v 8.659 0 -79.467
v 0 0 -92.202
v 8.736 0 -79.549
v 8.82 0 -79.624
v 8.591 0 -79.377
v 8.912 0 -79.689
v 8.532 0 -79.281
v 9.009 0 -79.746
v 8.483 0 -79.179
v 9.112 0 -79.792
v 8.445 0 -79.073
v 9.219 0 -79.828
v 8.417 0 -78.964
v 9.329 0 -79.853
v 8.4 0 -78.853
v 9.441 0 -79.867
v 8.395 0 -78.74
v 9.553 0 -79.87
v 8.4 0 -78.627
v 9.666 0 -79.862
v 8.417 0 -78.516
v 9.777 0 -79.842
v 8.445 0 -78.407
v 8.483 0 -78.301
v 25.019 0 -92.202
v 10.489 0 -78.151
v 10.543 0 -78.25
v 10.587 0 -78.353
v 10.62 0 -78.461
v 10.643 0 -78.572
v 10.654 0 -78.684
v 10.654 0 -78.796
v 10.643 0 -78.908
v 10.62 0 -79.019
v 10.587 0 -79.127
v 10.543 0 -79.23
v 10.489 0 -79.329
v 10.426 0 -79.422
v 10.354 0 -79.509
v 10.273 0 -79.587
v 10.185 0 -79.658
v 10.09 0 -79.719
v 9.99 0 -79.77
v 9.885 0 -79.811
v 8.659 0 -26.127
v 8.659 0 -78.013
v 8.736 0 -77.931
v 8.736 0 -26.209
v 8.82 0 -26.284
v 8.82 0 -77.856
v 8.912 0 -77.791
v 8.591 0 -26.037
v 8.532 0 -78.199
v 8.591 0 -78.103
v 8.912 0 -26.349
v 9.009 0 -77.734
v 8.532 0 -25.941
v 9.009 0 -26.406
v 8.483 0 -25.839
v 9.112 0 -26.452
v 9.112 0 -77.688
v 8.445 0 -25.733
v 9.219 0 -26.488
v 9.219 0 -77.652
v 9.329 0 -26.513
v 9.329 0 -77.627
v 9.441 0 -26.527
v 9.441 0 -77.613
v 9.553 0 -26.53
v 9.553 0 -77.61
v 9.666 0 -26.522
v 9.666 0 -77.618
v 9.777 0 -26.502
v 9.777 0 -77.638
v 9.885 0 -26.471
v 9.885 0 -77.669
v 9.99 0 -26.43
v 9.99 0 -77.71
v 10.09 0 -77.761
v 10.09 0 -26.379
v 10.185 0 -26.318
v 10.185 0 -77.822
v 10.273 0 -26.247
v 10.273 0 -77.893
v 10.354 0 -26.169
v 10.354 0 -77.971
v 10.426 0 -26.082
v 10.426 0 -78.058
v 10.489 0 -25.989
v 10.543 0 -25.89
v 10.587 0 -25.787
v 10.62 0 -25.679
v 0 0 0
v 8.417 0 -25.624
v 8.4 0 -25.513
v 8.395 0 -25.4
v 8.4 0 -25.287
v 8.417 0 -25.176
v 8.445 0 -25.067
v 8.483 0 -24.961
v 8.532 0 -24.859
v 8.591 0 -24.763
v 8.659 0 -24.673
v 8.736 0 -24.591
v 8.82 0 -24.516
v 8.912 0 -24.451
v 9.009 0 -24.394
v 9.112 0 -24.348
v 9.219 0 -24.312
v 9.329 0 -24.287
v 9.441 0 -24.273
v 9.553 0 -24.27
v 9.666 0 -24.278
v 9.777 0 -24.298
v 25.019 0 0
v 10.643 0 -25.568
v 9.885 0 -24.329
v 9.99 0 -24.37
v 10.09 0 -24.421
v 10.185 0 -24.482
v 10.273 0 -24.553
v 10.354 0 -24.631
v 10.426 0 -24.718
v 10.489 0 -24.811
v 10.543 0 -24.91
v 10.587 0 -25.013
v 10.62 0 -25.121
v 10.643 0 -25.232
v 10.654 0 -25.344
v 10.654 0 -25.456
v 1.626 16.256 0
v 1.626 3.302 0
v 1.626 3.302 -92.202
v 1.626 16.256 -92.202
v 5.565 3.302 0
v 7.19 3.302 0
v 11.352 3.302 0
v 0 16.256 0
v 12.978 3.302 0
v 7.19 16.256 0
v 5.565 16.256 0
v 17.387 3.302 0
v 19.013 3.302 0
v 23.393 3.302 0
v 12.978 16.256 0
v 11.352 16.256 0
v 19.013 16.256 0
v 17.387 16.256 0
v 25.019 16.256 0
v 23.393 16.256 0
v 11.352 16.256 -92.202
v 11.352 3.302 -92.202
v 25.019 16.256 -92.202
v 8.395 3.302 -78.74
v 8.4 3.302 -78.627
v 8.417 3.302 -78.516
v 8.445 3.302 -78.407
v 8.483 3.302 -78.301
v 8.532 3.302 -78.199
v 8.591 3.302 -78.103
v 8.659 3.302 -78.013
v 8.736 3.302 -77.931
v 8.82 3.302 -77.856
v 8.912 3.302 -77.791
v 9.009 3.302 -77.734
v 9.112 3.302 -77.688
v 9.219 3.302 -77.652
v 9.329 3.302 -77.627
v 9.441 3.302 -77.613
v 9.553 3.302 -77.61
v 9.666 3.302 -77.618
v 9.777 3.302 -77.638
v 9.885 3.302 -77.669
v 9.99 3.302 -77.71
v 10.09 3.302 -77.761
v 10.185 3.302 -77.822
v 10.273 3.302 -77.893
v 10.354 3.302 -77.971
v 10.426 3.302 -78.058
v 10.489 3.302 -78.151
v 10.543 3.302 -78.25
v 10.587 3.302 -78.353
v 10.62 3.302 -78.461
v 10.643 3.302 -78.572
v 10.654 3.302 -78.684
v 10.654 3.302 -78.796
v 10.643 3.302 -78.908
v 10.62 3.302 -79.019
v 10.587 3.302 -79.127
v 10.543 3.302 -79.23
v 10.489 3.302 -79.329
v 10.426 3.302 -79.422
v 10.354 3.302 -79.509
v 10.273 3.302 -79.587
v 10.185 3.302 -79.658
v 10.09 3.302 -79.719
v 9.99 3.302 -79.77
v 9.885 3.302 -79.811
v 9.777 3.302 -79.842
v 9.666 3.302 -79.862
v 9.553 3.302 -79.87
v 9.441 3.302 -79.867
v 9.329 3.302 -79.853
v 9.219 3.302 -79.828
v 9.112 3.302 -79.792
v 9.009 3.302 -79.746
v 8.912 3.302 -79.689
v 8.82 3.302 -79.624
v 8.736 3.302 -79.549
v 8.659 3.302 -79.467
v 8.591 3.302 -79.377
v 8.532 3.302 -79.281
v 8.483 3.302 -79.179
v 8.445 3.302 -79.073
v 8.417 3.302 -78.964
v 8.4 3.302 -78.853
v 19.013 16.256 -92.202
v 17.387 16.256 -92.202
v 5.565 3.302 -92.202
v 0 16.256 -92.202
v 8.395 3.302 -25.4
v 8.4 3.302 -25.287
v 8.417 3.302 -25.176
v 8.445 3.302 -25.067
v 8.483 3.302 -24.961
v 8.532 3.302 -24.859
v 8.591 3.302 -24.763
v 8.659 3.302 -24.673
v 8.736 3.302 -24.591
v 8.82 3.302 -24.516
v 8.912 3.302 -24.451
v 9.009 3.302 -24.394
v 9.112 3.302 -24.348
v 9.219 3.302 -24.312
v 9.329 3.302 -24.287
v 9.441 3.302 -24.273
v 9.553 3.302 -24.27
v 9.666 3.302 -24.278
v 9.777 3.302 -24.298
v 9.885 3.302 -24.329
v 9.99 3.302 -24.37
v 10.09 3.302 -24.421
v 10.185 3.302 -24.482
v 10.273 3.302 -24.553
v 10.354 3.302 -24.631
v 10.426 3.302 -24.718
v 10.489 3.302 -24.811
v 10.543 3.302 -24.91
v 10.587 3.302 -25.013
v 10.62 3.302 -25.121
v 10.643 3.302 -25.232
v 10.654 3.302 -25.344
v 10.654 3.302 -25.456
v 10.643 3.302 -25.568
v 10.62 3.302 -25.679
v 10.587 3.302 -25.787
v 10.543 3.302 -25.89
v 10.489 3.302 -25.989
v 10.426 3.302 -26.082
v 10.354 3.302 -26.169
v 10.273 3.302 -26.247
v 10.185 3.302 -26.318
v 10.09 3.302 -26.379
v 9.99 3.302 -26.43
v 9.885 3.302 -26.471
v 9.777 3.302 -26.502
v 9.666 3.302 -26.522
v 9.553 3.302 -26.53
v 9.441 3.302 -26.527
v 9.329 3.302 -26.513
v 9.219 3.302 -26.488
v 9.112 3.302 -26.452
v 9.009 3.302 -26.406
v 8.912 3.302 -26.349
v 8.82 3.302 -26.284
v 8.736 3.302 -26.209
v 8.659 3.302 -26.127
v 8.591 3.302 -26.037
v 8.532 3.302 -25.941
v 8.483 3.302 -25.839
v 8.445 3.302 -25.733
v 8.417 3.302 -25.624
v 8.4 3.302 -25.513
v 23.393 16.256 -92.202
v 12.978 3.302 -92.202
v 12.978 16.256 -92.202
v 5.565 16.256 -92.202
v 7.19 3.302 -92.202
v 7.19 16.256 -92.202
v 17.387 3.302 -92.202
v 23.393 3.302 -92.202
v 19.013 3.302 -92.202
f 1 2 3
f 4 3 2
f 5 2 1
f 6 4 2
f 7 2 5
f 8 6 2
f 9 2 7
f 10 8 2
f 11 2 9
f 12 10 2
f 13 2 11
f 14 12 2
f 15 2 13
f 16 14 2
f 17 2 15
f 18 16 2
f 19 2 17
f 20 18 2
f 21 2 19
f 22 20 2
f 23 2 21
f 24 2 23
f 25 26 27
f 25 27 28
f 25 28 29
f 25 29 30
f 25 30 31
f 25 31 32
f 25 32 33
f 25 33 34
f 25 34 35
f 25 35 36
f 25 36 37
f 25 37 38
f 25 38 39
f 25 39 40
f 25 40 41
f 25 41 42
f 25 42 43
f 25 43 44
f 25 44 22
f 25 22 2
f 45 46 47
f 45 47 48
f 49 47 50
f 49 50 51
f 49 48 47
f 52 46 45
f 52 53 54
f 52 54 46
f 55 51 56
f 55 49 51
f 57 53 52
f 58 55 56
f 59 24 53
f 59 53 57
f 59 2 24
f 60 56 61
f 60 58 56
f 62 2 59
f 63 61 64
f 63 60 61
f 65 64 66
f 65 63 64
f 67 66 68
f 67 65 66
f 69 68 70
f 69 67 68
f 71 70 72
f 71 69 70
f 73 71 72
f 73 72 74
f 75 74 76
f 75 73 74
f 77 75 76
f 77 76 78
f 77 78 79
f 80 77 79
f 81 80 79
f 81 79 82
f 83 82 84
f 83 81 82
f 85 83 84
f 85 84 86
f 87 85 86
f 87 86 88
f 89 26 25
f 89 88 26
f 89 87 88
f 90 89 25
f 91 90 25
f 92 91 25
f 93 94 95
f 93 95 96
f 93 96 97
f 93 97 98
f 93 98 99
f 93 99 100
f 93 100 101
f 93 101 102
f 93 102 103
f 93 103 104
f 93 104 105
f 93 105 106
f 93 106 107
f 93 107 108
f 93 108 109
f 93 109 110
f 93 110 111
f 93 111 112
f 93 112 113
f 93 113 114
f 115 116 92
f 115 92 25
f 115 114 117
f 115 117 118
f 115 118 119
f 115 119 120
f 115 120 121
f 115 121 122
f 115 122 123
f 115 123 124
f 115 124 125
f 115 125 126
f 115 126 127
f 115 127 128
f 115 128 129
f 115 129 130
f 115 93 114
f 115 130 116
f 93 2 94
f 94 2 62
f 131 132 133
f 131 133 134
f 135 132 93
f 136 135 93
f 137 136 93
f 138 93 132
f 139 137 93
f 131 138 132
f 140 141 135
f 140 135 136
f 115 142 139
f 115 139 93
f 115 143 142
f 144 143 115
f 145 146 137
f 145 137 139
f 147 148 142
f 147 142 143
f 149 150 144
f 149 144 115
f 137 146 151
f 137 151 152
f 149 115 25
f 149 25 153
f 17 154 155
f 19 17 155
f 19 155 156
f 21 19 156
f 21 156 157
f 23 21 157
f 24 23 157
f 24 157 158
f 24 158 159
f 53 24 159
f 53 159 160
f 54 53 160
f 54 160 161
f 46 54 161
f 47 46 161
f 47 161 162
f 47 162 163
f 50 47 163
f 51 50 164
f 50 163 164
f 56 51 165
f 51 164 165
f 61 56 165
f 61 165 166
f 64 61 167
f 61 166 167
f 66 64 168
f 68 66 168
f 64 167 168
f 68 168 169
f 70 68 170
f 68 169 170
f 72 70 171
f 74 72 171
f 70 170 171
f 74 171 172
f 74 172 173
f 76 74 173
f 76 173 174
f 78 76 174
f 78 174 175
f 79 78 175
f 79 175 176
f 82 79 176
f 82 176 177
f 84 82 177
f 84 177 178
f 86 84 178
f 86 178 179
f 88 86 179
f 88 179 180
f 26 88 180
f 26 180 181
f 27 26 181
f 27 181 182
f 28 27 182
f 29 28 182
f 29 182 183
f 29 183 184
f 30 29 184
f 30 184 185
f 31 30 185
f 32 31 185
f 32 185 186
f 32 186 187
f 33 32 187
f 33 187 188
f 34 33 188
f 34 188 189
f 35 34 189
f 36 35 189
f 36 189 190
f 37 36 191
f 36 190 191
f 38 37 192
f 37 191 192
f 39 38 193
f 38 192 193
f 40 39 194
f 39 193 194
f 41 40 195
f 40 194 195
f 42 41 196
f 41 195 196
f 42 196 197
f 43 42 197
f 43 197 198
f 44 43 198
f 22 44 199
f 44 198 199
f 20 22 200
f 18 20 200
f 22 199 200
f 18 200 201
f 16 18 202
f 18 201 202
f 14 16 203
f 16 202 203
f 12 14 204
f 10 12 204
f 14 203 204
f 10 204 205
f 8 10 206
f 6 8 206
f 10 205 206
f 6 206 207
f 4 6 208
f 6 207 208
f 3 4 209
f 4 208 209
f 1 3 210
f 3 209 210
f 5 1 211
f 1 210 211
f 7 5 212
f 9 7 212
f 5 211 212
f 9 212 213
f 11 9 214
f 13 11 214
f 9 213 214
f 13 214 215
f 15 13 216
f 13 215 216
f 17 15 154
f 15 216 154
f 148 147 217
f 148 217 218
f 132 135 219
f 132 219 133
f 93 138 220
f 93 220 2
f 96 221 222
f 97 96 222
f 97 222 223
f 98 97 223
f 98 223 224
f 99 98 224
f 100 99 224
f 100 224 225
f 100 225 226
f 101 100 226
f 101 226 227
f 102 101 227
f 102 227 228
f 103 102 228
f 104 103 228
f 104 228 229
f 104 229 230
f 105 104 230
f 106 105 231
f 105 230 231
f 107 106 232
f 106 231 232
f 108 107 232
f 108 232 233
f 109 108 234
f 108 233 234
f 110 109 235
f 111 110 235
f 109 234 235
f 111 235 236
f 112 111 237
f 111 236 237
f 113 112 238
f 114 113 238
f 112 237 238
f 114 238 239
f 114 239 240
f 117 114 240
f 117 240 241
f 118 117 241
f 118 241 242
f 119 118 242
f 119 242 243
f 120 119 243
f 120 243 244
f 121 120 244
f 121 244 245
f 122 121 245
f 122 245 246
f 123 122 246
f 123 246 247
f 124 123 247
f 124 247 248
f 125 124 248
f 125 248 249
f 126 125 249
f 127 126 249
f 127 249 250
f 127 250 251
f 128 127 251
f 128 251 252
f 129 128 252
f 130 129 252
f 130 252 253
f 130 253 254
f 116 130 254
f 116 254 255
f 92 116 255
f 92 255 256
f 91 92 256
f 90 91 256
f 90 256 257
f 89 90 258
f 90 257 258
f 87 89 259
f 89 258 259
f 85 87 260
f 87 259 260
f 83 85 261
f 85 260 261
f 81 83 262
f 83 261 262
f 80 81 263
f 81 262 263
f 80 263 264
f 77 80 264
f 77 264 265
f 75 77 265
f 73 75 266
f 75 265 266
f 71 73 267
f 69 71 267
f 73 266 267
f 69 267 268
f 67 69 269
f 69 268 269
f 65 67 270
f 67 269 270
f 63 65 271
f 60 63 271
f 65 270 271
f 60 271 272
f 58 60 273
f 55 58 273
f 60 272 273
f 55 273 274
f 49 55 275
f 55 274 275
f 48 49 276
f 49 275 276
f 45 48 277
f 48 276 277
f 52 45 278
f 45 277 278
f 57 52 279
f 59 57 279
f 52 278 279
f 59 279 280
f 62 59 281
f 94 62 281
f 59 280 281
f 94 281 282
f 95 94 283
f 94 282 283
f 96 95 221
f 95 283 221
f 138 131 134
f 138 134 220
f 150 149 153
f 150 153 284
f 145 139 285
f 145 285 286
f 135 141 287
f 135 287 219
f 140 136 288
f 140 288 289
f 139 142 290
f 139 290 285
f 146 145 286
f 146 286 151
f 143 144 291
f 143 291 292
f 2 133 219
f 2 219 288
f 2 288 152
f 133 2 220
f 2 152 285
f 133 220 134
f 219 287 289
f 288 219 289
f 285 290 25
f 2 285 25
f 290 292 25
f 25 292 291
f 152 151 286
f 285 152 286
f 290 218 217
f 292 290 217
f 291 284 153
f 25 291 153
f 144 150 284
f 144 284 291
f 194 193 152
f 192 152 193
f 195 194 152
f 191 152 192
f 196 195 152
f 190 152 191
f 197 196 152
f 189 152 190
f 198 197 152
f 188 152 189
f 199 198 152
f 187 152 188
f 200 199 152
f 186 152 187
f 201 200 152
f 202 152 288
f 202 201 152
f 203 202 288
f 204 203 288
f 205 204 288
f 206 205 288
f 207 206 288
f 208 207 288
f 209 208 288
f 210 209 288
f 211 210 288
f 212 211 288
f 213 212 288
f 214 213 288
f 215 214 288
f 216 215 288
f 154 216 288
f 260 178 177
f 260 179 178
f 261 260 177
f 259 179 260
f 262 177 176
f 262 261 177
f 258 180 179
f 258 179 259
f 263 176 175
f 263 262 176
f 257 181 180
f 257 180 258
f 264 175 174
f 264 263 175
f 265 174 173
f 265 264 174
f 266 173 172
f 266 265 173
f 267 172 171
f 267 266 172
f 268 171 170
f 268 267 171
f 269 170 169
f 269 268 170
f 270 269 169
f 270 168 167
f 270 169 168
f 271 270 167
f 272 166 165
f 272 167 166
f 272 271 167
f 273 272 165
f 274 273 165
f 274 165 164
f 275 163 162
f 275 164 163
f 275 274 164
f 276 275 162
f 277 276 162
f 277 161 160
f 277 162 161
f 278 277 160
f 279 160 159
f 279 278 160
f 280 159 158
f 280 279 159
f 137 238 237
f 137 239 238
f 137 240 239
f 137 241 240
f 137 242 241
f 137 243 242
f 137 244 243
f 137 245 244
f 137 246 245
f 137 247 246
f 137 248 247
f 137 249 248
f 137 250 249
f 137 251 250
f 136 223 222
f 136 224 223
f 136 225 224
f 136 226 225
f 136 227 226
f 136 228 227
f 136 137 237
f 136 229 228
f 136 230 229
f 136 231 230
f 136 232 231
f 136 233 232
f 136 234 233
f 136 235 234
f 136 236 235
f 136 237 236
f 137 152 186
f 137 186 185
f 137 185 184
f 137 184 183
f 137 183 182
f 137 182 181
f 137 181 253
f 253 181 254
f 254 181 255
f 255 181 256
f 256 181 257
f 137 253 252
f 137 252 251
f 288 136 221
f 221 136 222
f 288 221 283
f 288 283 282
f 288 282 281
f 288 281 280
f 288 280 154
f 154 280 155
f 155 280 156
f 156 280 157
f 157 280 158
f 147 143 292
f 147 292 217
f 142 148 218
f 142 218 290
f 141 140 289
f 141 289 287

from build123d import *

# Parameters (mm, degrees)
EXTRUDE1_DEPTH            = 92.202
F_4_40_TAPPED_HOLE1_D     = 2.2606
F_4_40_TAPPED_HOLE1_DEPTH = 7.5946
F_4_40_TAPPED_HOLE1_TIP   = 0.679152758


with BuildPart() as part:
    # Sketch1 → Extrude1 (new body)
    with BuildSketch(Plane.XY):
        Polygon((0, 0), (25.019, 0), (25.019, 16.256), (23.3934, 16.256), (23.3934, 3.302), (19.013003595, 3.302), (19.013003595, 16.256), (17.387403595, 16.256), (17.387403595, 3.302), (12.97763135, 3.302), (12.97763135, 16.256), (11.35203135, 16.256), (11.35203135, 3.302), (7.190288103, 3.302), (7.190288103, 16.256), (5.564688103, 16.256), (5.564688103, 3.302), (1.6256, 3.302), (1.6256, 16.256), (0, 16.256), align=None)
    extrude(amount=-EXTRUDE1_DEPTH)

    # #4-40 Tapped Hole1
    with Locations(Plane.XZ):
        with Locations((9.525, -25.4), (9.525, -78.74)):
            Hole(F_4_40_TAPPED_HOLE1_D / 2, depth=F_4_40_TAPPED_HOLE1_DEPTH)
            with Locations((0, 0, -(F_4_40_TAPPED_HOLE1_DEPTH + F_4_40_TAPPED_HOLE1_TIP / 2))):  # 118° drill point
                Cone(0, F_4_40_TAPPED_HOLE1_D / 2, F_4_40_TAPPED_HOLE1_TIP, mode=Mode.SUBTRACT)


solid = part.part
